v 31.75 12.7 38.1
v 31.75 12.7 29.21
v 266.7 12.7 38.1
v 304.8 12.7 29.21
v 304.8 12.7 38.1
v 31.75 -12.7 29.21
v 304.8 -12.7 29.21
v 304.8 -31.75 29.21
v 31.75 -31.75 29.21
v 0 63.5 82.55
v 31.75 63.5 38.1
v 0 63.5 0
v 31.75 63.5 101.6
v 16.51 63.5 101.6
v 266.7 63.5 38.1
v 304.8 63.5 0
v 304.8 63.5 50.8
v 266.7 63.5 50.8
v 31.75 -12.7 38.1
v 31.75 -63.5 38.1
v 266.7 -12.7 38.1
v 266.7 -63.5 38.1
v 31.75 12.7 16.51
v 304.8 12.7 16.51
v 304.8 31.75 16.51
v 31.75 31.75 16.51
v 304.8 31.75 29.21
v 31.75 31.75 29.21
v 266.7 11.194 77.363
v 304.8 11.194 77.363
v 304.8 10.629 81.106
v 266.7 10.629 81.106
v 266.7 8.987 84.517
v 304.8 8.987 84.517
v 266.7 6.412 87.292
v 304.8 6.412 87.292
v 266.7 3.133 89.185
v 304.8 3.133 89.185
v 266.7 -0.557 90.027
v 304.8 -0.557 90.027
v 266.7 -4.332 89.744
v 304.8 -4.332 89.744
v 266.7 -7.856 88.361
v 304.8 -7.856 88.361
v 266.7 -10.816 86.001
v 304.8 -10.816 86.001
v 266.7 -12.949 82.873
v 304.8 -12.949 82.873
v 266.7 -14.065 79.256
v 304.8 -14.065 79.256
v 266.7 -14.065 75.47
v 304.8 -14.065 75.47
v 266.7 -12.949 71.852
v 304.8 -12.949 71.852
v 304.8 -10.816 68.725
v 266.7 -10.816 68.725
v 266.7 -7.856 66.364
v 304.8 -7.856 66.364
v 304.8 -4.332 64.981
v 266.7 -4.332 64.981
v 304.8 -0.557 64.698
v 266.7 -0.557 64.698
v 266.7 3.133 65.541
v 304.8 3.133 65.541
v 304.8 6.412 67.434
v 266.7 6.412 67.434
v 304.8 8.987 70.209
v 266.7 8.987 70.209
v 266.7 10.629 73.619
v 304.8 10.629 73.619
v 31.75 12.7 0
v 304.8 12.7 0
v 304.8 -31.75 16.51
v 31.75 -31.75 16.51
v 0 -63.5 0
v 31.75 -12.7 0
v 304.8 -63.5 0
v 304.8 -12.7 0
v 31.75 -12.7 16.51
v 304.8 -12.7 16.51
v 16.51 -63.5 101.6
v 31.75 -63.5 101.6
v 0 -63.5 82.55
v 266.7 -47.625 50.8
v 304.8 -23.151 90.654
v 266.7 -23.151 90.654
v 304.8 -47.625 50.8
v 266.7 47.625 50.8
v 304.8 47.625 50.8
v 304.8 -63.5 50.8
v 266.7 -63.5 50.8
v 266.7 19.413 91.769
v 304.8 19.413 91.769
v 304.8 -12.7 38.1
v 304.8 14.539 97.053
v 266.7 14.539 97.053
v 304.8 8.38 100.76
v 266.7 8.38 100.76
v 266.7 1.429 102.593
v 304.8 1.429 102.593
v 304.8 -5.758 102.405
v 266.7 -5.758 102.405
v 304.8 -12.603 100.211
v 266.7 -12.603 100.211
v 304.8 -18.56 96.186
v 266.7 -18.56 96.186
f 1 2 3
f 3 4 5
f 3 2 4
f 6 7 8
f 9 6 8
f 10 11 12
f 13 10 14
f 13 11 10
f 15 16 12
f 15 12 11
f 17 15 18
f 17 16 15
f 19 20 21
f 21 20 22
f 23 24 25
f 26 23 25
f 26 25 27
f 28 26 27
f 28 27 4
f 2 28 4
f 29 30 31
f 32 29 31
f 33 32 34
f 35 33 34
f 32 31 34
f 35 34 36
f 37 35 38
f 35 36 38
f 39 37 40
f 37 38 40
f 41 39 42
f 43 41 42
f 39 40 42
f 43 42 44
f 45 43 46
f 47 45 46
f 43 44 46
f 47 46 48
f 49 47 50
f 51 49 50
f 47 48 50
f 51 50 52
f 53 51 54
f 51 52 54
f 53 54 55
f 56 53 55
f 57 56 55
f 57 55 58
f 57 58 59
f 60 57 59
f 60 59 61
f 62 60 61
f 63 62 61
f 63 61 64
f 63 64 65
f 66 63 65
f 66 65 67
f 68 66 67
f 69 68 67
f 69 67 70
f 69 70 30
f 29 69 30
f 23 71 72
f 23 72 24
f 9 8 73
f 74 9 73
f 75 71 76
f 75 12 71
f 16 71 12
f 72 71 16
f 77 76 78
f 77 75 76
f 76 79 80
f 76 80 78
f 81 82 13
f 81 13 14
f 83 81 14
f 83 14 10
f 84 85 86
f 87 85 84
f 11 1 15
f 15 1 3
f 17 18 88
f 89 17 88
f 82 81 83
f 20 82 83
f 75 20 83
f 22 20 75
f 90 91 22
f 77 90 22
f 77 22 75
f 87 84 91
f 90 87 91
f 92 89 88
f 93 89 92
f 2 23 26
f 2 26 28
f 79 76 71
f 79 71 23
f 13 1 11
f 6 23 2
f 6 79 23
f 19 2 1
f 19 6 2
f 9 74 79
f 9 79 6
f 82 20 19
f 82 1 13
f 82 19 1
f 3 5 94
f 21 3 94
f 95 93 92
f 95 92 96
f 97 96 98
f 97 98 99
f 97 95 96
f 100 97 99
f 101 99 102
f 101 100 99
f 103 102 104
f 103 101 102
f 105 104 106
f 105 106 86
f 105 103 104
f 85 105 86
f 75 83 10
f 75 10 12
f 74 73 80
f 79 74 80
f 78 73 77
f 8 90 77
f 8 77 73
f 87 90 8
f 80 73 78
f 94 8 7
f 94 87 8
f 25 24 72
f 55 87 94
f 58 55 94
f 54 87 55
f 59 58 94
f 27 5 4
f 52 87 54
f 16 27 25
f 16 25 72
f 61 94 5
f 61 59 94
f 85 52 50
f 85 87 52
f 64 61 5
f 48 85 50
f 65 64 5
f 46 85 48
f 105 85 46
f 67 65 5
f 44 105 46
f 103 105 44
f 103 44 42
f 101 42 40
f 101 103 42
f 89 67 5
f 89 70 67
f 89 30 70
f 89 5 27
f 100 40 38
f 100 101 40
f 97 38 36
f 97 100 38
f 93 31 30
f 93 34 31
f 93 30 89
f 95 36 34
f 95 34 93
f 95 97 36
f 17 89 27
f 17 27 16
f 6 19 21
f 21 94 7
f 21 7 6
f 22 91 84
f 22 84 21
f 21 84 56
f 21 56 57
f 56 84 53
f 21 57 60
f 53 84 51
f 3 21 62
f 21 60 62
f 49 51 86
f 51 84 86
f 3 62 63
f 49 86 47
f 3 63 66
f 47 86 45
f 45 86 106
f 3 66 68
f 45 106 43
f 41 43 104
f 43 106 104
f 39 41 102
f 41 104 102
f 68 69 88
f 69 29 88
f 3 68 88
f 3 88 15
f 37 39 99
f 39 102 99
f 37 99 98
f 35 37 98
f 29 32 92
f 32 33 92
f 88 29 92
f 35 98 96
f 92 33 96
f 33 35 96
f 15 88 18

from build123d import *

# Parameters (mm, degrees)
F0_W     = 304.8
F0_H     = 38.1
F1_DEPTH = 63.5
F3_DEPTH = 127
F5_DEPTH = 38.1
F6_R     = 12.7
F7_DEPTH = 55.88
F9_DEPTH = 273.05


with BuildPart() as f1:
    # F0 (on Front) → F1 (new body, symmetric)
    with BuildSketch(Plane.XZ):
        with Locations((152.4, 19.05)):
            Rectangle(F0_W, F0_H)
    extrude(amount=F1_DEPTH, both=True)

    # F2 (on face) → F3 (join)
    with BuildSketch(Plane.XZ.offset(63.5)):
        Polygon((0, 82.55), (0, 38.1), (31.75, 38.1), (31.75, 101.6), (16.51, 101.6), align=None)
    extrude(amount=-F3_DEPTH)

    # F4 (on face) → F5 (join)
    with BuildSketch(Plane.YZ.offset(304.8)):
        with BuildLine():
            Line((-63.5, 50.8), (-63.5, 0))
            Line((-63.5, 0), (63.5, 0))
            Line((63.5, 0), (63.5, 50.8))
            Line((63.5, 50.8), (47.625, 50.8))
            Line((47.625, 50.8), (19.413296, 91.768501))
            ThreePointArc((19.413296, 91.768501), (-2.171038, 102.754075), (-23.151125, 90.654394))
            Line((-23.151125, 90.654394), (-47.625, 50.8))
            Line((-47.625, 50.8), (-63.5, 50.8))
        make_face()
    extrude(amount=-F5_DEPTH)

    # F6 (on face) → F7 (cut)
    with BuildSketch(Plane.YZ.offset(304.8)):
        with Locations((-1.506431, 77.362772)):
            Circle(F6_R)
    extrude(amount=-F7_DEPTH, mode=Mode.SUBTRACT)

    # F8 (on face) → F9 (cut)
    with BuildSketch(Plane.YZ.offset(304.8)):
        Polygon((-12.7, 0), (0, 0), (12.7, 0), (12.7, 16.51), (31.75, 16.51), (31.75, 29.21), (12.7, 29.21), (12.7, 38.1), (-12.7, 38.1), (-12.7, 29.21), (-31.75, 29.21), (-31.75, 16.51), (-12.7, 16.51), align=None)
    extrude(amount=-F9_DEPTH, mode=Mode.SUBTRACT)


solid = f1.part
